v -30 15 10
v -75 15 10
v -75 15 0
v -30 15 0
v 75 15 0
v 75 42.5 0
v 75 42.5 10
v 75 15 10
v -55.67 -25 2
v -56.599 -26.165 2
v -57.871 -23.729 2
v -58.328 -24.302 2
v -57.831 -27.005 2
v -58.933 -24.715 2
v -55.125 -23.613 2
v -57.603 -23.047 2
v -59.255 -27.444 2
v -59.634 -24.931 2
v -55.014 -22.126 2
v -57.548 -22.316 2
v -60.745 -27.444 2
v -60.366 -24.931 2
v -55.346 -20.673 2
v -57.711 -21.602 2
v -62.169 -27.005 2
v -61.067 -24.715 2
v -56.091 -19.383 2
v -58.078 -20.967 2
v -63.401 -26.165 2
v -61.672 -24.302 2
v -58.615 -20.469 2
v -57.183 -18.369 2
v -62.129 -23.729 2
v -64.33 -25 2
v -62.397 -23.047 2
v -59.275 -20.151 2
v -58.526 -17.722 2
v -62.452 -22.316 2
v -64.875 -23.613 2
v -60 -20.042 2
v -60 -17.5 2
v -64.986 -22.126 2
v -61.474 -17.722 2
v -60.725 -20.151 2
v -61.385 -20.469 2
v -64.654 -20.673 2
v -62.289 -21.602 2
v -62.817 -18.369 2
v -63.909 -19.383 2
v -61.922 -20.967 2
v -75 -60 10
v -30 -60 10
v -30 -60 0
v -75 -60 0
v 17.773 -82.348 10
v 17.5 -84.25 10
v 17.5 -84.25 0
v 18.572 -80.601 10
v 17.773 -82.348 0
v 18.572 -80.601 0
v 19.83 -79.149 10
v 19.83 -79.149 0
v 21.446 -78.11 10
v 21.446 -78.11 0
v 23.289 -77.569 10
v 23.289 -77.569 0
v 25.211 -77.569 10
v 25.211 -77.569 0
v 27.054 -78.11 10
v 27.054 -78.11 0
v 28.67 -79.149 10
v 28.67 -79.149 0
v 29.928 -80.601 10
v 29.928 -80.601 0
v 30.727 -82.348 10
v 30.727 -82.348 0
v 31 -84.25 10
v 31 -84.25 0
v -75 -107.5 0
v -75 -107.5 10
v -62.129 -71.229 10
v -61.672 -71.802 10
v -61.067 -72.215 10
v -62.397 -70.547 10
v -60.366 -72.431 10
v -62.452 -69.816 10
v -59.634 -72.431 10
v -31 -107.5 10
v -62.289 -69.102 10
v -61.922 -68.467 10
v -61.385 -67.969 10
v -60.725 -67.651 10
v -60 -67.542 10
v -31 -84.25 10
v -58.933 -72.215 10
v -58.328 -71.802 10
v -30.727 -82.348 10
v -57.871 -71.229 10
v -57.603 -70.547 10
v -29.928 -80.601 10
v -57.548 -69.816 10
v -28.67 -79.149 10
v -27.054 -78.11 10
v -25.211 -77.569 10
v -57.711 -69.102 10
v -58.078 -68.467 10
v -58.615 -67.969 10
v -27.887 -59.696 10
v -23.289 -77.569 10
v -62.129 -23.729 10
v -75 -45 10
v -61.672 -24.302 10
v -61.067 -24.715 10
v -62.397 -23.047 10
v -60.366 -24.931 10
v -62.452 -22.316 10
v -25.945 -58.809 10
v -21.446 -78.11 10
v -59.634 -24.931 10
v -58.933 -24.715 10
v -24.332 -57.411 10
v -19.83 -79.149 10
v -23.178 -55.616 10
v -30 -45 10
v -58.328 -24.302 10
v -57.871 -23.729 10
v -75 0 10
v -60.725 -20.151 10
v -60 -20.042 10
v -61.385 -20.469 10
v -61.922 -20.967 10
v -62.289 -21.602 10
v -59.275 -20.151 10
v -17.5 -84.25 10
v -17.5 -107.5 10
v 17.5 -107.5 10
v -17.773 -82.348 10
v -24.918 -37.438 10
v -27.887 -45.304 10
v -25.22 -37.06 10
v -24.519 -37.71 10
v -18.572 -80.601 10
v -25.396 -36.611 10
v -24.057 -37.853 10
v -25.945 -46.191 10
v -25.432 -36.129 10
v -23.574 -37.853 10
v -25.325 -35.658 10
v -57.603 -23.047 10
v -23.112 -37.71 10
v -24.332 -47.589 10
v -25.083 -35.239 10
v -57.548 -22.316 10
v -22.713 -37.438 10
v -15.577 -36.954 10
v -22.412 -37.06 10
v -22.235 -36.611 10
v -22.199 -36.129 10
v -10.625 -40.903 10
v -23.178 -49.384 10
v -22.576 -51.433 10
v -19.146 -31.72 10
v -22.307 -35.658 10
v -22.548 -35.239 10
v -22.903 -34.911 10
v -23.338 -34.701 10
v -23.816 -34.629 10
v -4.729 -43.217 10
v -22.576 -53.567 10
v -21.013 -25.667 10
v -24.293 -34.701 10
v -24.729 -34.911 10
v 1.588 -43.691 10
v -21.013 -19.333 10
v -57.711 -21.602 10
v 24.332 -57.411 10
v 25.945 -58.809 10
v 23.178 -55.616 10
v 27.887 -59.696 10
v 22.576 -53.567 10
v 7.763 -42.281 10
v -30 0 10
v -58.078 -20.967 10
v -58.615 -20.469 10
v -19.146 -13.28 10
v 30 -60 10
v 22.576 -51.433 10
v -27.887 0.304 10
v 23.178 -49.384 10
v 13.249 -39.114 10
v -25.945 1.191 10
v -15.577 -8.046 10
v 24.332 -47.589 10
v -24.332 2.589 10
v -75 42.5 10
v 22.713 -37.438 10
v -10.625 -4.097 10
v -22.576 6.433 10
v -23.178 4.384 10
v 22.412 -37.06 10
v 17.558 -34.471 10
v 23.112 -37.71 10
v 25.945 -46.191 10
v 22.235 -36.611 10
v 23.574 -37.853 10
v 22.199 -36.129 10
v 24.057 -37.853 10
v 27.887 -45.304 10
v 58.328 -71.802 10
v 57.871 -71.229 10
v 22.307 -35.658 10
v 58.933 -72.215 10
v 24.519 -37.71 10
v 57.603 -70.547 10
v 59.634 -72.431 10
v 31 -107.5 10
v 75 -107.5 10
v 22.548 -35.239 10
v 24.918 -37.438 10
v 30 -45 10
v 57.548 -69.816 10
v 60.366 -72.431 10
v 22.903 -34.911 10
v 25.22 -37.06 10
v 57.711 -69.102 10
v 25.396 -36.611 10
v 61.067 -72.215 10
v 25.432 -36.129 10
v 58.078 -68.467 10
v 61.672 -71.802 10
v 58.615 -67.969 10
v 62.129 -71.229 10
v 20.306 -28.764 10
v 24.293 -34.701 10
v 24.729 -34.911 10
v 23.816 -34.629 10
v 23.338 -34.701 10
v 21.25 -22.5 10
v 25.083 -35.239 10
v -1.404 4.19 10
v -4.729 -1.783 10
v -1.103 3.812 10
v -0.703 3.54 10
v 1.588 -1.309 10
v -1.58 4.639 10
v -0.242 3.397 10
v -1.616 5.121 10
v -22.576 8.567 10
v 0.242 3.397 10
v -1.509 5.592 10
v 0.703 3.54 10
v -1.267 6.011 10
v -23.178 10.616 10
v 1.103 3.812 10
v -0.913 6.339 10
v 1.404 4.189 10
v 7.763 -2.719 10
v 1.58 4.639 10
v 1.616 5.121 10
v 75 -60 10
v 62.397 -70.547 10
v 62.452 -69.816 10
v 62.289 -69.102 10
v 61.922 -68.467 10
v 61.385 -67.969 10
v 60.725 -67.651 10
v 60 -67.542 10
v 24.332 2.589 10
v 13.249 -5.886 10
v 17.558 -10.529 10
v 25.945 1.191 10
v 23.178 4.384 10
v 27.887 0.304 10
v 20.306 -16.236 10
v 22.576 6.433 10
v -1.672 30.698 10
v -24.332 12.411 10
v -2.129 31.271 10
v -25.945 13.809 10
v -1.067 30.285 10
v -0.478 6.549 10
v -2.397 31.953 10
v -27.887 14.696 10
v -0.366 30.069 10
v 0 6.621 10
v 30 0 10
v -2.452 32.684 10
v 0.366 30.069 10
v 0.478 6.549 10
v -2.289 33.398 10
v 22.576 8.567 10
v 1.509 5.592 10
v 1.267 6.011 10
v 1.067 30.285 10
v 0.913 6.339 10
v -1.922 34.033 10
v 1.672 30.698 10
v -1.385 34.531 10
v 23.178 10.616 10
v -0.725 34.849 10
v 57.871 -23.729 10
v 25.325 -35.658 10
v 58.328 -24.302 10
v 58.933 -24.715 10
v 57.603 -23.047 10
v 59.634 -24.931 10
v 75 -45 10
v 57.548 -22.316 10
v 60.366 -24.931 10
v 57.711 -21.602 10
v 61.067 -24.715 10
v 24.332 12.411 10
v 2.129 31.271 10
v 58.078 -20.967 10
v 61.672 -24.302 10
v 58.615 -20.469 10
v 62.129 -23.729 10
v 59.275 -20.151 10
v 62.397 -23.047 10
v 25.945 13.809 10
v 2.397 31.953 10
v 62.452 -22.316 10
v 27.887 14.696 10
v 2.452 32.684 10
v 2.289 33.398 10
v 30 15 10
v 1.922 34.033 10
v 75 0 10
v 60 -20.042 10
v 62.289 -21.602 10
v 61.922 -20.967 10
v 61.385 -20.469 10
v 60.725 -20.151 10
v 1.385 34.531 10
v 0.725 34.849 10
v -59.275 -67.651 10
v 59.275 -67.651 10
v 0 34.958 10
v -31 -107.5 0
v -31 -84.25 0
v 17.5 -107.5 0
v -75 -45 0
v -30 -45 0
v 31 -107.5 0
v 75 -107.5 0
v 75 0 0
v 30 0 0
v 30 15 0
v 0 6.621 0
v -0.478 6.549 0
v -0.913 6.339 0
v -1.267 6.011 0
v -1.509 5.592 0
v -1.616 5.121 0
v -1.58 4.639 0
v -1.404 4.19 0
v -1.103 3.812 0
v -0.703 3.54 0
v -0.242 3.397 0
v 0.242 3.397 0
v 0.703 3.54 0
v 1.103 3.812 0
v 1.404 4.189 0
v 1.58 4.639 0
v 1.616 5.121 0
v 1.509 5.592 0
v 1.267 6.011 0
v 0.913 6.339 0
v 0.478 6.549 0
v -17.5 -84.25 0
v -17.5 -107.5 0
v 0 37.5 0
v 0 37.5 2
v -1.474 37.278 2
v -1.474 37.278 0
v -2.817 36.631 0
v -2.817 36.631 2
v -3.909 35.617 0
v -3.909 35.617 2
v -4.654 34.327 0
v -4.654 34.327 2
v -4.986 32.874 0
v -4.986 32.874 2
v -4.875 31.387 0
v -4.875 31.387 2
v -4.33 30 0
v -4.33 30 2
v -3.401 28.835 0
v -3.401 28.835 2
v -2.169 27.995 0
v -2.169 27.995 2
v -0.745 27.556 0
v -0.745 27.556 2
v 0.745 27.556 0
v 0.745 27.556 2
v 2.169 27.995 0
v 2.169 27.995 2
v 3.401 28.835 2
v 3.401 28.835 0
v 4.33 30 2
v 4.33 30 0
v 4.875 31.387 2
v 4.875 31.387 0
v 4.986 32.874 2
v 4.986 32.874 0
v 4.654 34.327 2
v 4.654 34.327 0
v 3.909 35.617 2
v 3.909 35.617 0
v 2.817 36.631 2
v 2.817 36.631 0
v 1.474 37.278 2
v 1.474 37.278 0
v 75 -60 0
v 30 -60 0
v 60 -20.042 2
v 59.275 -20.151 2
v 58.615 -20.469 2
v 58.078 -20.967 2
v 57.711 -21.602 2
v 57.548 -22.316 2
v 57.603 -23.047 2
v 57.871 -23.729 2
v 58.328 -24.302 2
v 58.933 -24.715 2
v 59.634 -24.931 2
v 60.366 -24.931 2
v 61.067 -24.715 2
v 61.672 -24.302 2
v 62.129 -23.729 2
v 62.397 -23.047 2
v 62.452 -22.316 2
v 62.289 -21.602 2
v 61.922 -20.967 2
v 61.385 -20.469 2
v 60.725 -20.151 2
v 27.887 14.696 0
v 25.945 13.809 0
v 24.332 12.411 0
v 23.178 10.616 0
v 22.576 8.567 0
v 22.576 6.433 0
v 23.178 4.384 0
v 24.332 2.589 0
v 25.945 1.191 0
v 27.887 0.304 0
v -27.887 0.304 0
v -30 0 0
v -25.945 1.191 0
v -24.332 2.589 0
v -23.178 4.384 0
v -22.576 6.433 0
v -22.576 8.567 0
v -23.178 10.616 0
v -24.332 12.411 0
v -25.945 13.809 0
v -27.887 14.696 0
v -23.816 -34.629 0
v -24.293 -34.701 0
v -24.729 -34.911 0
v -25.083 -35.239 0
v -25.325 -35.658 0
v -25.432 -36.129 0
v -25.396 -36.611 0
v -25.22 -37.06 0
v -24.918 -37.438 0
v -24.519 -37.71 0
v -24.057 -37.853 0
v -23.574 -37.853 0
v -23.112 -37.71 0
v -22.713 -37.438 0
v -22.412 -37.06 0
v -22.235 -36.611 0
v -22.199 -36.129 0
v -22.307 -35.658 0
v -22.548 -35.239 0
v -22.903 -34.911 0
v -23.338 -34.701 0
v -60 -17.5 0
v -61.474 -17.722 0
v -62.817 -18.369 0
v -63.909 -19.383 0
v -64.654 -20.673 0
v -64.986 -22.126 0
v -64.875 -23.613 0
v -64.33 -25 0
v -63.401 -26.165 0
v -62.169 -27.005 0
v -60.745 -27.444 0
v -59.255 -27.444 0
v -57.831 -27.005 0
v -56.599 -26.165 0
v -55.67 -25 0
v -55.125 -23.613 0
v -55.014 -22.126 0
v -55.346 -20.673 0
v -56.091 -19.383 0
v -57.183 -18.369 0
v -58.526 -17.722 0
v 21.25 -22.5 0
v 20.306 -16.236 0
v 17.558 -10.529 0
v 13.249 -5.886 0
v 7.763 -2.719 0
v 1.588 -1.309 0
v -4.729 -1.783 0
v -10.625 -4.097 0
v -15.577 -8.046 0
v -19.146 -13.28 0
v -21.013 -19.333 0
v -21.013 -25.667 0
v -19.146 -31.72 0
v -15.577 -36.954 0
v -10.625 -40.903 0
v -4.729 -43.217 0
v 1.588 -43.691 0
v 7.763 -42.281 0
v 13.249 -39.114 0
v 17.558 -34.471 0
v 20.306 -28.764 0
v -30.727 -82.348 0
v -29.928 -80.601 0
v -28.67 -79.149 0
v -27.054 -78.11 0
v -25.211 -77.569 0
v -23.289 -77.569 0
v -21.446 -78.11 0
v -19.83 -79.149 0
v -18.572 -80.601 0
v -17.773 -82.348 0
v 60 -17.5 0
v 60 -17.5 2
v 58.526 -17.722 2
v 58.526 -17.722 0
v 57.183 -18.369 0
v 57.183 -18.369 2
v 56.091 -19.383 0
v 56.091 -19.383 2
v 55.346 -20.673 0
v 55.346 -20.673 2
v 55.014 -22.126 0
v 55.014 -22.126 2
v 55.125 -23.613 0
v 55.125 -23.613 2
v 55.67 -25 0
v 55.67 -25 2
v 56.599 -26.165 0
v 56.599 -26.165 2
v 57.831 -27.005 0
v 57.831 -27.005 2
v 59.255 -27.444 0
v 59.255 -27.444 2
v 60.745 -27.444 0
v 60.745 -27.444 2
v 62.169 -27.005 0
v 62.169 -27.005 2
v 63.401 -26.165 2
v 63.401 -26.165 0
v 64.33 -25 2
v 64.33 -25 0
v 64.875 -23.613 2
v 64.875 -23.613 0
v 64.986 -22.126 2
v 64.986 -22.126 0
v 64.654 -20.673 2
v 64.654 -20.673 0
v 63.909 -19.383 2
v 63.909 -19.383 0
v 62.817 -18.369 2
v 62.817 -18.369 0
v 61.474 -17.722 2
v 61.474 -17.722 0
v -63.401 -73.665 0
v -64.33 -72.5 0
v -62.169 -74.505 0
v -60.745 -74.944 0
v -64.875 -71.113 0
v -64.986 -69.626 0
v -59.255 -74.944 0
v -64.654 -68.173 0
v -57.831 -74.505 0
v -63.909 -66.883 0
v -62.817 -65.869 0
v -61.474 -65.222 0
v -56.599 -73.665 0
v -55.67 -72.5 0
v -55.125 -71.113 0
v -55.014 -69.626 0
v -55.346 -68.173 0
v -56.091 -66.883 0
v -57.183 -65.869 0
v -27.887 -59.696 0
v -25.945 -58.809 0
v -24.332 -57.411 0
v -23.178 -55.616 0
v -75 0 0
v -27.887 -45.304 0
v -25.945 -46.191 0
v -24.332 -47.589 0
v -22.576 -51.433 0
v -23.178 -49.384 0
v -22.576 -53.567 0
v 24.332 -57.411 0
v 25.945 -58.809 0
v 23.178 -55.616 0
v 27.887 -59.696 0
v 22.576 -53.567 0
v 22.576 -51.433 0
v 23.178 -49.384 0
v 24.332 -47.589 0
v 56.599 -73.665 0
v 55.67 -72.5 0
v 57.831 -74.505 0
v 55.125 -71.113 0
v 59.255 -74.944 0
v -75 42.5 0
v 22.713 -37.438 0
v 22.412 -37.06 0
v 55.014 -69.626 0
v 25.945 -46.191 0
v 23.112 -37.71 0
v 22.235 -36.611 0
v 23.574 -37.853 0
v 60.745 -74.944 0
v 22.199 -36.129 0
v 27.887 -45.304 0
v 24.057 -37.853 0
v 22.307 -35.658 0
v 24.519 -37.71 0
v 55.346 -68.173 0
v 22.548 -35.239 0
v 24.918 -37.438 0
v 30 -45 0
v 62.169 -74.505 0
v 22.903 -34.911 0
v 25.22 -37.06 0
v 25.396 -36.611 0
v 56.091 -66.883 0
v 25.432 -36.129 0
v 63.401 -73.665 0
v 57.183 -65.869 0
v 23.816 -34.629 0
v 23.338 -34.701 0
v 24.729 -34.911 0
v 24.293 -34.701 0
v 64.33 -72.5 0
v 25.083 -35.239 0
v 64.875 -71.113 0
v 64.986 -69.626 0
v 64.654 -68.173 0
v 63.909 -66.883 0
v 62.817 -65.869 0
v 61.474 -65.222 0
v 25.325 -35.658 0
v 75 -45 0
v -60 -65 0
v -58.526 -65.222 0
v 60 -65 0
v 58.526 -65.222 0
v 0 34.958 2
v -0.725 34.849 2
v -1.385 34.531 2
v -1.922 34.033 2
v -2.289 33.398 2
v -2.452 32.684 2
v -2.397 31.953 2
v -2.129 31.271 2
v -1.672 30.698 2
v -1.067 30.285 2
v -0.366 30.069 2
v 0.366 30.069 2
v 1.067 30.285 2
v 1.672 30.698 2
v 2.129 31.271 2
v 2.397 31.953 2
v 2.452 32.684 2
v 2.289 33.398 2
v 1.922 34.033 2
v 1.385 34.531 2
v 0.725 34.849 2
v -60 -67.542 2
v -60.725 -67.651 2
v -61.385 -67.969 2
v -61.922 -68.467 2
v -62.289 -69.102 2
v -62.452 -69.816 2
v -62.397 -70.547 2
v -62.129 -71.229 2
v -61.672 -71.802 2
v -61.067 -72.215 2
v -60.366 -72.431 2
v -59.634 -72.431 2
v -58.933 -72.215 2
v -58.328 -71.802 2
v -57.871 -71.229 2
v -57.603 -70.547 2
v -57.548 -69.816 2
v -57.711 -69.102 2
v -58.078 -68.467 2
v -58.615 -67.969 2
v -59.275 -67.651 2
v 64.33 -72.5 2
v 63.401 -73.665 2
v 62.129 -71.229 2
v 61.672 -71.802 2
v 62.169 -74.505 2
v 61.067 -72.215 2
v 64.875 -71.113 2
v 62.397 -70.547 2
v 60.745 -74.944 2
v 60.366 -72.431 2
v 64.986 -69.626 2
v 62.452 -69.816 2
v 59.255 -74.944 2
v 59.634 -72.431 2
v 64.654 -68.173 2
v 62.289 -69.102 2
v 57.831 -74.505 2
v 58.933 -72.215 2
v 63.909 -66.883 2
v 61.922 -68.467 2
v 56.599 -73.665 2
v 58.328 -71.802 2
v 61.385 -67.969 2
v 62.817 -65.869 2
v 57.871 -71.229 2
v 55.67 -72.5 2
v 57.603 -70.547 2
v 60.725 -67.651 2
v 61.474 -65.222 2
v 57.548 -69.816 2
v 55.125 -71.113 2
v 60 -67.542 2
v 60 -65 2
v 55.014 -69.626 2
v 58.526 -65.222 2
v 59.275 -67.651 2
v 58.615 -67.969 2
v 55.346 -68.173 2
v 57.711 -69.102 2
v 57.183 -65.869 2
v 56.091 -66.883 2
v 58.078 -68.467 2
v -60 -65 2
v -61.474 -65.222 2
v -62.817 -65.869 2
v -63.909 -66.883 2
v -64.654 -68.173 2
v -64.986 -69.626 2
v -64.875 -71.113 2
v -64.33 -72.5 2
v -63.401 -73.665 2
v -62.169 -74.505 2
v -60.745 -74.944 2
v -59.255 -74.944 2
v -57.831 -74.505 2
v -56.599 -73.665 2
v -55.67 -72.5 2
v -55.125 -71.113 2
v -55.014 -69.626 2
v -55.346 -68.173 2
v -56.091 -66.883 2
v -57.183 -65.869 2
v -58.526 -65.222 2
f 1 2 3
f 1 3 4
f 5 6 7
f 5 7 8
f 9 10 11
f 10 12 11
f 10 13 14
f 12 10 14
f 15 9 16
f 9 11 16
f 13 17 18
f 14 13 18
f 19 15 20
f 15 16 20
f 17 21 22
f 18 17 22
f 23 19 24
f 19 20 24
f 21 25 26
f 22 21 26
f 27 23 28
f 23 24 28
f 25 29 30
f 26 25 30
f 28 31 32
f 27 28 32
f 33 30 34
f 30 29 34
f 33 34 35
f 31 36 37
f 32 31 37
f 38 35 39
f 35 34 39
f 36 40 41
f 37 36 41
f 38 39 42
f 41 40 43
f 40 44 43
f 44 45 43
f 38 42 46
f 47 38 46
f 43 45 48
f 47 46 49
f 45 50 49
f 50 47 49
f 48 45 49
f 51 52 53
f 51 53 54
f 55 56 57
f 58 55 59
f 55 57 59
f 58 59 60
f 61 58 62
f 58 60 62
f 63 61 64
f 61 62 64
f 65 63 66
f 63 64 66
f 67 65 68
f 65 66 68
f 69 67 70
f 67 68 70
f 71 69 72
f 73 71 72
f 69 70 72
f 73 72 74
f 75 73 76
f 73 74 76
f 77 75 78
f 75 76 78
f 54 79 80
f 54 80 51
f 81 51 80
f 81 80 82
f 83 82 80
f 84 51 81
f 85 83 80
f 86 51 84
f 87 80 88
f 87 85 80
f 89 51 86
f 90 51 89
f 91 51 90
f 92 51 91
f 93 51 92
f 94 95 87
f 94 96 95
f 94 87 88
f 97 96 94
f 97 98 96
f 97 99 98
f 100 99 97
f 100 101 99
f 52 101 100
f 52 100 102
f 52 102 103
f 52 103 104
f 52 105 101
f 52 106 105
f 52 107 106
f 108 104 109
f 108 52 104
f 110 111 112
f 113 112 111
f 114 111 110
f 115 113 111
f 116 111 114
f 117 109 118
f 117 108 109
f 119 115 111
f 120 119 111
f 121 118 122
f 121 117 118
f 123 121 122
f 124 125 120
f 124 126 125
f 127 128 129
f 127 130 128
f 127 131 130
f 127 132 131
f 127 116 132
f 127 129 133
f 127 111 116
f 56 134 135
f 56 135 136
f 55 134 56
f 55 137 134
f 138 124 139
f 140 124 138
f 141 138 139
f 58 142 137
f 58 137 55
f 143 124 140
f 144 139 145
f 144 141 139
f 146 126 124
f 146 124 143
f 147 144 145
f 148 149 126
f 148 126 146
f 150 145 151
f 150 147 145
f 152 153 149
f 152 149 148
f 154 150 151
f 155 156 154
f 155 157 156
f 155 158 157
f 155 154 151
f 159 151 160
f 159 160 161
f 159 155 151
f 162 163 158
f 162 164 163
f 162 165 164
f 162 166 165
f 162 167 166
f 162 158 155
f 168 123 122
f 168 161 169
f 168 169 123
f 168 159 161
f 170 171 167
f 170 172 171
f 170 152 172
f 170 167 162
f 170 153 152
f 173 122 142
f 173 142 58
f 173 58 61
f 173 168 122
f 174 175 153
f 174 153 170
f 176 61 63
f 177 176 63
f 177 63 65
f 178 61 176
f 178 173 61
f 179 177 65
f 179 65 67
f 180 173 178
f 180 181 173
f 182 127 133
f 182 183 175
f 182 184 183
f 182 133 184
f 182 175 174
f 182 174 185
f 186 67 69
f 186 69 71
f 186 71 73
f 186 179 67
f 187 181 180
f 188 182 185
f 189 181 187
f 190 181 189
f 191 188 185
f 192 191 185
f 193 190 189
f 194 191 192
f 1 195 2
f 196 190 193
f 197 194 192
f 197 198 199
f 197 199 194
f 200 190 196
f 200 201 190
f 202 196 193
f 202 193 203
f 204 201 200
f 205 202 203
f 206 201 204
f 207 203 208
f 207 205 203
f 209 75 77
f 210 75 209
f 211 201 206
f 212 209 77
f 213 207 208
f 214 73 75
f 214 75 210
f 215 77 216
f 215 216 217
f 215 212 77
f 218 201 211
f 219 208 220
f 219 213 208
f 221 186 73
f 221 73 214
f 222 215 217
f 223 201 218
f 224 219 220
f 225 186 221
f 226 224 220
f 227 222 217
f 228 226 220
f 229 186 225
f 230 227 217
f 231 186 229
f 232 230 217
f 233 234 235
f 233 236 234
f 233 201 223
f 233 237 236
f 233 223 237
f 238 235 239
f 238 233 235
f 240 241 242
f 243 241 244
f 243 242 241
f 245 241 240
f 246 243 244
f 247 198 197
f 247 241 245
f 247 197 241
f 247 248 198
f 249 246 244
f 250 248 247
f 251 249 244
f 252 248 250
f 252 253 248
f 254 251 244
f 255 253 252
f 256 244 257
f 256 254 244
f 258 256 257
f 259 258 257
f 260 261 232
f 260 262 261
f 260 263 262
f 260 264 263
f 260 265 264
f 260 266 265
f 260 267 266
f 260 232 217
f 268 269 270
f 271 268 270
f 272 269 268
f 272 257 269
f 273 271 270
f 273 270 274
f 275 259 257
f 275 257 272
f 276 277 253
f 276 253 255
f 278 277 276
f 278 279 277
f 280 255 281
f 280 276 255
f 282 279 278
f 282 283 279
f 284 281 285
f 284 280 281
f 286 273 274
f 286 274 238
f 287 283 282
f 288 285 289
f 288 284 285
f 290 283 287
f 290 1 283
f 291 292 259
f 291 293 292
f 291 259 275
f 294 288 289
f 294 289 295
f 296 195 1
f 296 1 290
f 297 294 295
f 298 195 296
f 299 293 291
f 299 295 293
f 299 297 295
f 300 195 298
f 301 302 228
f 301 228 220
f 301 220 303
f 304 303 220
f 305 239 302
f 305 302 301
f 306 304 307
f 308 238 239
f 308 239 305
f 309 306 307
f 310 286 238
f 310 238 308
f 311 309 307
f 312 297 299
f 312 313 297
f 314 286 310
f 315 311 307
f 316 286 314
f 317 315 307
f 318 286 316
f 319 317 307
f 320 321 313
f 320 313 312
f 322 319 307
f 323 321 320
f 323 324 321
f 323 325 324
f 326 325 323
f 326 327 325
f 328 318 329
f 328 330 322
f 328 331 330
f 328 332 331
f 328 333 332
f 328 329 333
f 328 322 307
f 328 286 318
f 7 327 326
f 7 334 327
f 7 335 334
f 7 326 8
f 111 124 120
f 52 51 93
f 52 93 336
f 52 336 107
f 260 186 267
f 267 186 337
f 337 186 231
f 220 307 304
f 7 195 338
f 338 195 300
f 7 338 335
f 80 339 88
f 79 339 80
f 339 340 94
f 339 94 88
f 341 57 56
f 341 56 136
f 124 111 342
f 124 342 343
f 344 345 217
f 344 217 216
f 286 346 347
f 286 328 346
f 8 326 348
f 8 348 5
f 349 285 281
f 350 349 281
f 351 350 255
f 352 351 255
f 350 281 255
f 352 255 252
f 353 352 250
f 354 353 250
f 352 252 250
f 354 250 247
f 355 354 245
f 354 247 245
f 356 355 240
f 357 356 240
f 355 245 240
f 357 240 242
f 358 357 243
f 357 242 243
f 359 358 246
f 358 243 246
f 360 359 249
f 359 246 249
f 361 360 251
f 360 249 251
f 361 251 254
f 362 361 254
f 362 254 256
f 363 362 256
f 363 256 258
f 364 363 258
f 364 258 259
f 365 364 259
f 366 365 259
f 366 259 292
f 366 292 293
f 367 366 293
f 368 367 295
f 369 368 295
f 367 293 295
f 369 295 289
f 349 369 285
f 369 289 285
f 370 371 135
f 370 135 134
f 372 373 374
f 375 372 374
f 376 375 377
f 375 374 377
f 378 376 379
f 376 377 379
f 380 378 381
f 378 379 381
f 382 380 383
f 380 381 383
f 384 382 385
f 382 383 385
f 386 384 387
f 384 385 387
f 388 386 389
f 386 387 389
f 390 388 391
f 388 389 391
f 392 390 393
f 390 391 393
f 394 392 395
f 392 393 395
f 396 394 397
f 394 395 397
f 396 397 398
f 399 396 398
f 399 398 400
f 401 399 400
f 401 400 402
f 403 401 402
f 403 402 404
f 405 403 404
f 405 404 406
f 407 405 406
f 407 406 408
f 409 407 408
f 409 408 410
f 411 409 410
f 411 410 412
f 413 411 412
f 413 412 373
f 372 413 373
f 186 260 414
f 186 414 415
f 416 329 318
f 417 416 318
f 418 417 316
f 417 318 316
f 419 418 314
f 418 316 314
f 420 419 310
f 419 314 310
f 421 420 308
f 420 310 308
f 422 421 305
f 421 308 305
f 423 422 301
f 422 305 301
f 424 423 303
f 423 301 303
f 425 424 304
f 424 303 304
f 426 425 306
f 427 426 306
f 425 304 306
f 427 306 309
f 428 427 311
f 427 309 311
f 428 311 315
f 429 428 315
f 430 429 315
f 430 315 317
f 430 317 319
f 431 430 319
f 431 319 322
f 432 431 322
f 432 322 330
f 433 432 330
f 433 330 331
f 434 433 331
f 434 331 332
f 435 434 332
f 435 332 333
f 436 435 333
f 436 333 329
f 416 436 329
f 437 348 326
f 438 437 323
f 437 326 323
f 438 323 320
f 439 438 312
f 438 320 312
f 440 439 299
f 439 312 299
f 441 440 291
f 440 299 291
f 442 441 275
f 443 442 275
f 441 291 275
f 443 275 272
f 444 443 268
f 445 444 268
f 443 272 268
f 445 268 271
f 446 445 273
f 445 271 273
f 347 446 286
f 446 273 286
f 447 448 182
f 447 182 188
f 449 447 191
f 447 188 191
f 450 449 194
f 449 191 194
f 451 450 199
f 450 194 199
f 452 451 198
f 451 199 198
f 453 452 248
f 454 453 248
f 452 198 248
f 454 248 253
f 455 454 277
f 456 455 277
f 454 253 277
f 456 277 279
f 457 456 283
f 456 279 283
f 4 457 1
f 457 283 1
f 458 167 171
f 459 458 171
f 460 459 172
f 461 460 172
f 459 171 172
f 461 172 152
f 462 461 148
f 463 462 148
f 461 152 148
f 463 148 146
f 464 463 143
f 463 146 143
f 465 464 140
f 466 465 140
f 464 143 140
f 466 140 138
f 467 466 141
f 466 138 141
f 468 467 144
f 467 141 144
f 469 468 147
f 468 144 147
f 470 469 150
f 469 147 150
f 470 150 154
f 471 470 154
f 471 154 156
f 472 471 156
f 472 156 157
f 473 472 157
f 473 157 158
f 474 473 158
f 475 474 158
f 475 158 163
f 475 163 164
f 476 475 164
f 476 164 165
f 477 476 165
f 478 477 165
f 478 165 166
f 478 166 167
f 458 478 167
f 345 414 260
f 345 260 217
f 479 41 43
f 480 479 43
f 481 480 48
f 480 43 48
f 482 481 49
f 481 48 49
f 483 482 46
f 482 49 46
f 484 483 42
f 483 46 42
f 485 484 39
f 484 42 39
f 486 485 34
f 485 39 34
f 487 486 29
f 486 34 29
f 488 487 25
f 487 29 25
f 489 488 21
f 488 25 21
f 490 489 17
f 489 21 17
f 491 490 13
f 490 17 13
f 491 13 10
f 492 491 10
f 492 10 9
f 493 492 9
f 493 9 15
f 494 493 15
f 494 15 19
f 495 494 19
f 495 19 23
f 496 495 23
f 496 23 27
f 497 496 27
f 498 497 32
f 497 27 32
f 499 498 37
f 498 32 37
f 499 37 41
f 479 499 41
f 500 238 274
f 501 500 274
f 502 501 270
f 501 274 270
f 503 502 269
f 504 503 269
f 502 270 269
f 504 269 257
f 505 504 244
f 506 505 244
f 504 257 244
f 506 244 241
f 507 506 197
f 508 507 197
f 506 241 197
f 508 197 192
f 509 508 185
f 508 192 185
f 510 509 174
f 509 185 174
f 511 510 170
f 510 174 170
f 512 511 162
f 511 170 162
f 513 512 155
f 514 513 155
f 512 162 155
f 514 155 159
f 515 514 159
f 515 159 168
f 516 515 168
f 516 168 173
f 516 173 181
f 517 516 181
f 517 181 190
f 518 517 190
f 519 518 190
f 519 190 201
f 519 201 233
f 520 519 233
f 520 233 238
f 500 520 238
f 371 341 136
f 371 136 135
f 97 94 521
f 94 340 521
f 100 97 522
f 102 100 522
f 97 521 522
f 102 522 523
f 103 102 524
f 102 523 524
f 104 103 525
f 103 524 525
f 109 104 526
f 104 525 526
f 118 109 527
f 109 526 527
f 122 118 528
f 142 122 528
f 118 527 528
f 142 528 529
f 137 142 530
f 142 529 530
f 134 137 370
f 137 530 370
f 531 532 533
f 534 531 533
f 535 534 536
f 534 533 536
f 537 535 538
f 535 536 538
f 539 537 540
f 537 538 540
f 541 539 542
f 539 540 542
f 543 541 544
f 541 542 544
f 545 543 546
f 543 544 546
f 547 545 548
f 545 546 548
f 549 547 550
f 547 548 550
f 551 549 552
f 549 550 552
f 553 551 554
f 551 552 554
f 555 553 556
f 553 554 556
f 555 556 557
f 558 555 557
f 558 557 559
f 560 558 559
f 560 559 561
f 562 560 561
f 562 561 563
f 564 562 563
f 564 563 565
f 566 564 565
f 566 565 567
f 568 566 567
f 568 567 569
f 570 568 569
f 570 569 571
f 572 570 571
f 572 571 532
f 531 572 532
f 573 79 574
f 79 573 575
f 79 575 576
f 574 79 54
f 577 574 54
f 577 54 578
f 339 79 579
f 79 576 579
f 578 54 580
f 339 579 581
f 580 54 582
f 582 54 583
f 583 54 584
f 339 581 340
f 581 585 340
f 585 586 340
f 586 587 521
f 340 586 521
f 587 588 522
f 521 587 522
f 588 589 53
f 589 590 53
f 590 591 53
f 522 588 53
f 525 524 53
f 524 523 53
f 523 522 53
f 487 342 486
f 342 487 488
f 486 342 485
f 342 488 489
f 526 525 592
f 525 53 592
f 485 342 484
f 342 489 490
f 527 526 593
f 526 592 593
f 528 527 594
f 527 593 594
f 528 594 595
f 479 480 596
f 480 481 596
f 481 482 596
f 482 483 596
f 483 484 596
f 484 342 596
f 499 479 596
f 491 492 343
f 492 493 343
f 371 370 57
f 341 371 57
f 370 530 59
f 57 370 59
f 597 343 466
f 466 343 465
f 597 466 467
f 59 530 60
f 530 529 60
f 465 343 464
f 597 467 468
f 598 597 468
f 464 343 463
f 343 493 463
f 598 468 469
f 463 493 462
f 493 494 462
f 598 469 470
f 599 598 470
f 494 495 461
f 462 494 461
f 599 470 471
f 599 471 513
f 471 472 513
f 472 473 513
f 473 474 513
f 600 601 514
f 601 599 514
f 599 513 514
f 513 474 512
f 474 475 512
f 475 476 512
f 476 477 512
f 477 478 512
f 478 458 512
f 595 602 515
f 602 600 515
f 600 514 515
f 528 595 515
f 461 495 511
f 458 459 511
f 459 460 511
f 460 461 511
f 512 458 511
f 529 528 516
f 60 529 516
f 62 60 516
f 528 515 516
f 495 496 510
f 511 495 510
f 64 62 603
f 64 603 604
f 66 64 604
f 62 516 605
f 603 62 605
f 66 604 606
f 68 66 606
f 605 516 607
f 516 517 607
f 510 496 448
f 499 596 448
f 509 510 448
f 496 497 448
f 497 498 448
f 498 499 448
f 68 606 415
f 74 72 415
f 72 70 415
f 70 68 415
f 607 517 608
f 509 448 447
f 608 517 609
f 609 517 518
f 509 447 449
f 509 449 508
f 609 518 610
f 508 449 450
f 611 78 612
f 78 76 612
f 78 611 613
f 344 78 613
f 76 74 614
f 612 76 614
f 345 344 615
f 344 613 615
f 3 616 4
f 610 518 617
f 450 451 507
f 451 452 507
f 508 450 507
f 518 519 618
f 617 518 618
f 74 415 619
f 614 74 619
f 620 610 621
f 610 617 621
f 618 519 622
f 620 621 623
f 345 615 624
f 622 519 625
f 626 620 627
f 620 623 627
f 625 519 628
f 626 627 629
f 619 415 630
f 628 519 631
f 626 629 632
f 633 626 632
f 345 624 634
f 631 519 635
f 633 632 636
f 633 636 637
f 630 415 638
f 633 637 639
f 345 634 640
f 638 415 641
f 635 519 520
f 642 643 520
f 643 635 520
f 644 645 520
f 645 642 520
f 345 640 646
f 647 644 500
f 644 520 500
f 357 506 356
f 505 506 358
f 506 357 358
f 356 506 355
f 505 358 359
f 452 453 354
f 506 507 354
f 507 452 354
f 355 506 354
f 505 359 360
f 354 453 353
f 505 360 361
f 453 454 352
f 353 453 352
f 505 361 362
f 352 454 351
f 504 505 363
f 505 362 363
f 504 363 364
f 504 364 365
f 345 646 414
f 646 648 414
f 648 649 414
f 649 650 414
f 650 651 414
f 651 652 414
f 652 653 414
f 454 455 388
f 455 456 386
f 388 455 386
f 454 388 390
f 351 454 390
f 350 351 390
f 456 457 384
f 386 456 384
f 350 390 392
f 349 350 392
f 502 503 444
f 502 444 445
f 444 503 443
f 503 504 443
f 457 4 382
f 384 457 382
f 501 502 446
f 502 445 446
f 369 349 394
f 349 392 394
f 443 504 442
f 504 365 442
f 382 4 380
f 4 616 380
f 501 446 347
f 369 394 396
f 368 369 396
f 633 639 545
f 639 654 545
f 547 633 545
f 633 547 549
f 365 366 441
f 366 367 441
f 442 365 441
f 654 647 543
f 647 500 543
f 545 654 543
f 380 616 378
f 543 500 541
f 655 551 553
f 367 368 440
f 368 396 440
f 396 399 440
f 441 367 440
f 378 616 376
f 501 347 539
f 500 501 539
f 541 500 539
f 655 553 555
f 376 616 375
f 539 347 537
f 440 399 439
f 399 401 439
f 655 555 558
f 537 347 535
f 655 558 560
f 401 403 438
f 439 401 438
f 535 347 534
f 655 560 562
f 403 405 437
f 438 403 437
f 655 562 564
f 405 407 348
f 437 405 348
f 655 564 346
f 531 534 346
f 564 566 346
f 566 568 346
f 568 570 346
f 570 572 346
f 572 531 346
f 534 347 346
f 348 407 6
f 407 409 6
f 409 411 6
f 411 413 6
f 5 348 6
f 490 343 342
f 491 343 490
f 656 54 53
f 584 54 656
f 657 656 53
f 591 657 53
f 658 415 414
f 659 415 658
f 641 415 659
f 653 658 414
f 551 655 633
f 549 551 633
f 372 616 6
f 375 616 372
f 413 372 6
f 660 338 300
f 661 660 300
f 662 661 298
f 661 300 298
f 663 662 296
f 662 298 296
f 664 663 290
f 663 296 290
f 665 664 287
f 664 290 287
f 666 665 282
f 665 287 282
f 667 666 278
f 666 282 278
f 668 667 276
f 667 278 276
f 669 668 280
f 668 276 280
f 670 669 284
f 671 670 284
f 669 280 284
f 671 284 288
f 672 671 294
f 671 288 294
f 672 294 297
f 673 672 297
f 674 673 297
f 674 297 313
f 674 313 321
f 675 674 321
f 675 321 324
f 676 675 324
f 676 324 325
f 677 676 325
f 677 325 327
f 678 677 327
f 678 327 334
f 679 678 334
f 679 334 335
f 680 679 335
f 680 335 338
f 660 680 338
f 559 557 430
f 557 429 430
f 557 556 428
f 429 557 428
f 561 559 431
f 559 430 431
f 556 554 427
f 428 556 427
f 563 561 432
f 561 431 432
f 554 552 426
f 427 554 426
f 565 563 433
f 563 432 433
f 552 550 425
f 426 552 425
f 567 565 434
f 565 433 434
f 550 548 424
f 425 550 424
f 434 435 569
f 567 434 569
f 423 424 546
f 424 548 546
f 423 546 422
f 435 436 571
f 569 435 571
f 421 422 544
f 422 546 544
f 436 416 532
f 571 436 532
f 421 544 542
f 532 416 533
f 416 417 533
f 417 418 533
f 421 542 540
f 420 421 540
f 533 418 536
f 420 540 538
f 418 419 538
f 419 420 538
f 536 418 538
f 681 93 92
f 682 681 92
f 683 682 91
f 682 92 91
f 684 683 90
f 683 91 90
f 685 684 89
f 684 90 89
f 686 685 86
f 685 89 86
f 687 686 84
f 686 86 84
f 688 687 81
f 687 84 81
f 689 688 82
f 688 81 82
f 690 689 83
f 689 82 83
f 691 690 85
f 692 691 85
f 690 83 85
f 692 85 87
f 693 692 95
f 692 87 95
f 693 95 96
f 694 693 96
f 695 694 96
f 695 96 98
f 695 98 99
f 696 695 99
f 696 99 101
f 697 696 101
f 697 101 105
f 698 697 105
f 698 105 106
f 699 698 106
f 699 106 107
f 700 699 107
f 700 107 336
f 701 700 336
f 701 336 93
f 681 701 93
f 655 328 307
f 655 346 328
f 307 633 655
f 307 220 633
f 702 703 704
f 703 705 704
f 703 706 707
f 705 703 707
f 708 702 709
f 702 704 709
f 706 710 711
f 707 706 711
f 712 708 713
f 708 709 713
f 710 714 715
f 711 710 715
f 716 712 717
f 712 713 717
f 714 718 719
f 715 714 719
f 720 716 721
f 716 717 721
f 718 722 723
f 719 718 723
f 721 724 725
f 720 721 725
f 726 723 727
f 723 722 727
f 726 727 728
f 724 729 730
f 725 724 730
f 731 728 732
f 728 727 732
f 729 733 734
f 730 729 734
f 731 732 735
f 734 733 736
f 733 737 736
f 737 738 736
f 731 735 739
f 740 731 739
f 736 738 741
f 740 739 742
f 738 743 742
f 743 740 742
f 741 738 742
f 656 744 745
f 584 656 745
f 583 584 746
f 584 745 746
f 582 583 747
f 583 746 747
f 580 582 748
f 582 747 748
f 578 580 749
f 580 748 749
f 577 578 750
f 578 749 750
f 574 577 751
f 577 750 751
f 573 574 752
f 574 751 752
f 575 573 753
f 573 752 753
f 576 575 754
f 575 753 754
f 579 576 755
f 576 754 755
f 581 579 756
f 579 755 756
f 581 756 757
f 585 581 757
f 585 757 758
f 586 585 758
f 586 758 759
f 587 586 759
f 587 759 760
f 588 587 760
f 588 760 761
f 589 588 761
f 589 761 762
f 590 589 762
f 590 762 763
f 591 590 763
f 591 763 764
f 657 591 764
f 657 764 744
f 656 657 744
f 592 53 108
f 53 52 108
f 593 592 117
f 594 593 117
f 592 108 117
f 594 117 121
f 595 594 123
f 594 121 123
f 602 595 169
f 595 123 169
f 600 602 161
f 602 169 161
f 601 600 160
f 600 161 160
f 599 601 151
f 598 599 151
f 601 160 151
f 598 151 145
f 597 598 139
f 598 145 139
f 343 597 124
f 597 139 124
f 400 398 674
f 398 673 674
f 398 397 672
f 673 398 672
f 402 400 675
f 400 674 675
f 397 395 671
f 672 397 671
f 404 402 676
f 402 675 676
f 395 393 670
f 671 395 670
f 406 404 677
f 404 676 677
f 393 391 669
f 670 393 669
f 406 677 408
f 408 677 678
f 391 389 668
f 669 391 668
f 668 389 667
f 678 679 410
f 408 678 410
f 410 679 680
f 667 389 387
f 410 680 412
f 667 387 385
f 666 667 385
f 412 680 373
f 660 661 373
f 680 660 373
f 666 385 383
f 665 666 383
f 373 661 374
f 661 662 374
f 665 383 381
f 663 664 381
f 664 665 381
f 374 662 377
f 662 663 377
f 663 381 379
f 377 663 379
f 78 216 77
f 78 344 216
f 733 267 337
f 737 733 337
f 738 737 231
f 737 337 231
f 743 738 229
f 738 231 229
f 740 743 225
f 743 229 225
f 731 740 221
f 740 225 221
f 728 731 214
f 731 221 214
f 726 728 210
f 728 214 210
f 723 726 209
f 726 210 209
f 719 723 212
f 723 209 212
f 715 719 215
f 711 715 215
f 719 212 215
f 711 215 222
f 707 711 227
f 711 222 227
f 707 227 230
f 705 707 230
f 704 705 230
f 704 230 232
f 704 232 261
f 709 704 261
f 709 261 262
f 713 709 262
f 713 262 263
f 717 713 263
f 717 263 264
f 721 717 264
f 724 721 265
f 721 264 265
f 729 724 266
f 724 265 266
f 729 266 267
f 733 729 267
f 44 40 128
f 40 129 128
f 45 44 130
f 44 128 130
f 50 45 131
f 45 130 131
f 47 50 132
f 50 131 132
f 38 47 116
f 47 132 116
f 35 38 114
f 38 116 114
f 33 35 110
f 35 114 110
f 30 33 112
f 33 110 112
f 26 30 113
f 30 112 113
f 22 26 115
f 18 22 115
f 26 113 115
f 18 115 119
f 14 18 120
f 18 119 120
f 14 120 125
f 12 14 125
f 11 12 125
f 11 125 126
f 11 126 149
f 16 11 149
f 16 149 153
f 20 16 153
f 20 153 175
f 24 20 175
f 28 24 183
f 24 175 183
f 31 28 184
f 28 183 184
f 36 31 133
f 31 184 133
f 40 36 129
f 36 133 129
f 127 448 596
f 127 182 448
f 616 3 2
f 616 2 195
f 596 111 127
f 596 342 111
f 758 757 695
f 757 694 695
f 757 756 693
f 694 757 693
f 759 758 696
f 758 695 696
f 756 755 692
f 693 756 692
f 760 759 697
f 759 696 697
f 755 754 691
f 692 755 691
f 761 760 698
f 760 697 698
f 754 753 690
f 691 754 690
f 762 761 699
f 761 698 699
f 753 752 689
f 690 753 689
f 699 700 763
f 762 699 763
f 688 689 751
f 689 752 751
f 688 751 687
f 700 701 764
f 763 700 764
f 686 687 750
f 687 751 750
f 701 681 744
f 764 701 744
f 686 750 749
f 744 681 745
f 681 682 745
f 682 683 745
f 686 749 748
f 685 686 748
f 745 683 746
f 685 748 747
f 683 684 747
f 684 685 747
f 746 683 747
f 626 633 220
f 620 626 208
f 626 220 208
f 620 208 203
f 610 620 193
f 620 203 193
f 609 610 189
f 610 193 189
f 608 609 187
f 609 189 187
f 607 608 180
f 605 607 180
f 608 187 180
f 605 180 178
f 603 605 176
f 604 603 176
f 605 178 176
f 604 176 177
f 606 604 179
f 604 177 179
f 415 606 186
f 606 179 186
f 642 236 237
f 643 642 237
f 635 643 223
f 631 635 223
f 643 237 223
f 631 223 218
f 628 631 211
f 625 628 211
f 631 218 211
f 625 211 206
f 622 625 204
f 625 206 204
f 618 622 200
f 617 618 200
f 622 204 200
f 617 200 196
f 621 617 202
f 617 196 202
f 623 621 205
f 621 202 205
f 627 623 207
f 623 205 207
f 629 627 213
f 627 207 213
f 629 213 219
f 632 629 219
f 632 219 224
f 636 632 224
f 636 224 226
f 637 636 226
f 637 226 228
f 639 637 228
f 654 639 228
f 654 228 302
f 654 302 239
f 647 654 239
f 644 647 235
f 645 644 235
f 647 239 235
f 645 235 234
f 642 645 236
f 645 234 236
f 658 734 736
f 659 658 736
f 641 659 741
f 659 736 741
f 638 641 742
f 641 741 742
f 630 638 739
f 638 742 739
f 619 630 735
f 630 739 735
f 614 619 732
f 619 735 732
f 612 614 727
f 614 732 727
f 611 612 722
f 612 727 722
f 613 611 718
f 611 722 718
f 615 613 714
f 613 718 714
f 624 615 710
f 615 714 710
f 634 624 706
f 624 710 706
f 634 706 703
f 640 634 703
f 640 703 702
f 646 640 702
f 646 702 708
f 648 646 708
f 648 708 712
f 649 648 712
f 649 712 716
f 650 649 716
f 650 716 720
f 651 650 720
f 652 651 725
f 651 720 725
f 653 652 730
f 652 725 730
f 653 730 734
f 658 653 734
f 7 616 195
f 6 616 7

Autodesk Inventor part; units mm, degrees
ref_plane "YZ Plane" through (0, 0, 0) normal (1, 0, 0) x (0, 1, 0)
ref_plane "XZ Plane" through (0, 0, 0) normal (0, 1, 0) x (-1, 0, 0)
ref_plane "XY Plane" through (0, 0, 0) normal (0, 0, 1) x (1, 0, 0)
sketch "Sketch1" plane through (0, 0, 0) normal (0, 0, 1) x (1, 0, 0)
  line L0 (-75, 42.5) -> (75, 42.5)
  line L1 (75, 42.5) -> (75, -107.5)
  line L2 (75, -107.5) -> (-75, -107.5)
  line L3 (-75, -107.5) -> (-75, 42.5)
  point P0 (0, 0)
  dimension "d0" = 150
  dimension "d1" = 75
  dimension "d2" = 150
  dimension "d85" = 42.5
extrude "baseExtrusion" add sketch "Sketch1" along normal blind 10
sketch "Sketch3" plane through (0, 0, 10) normal (0, 0, 1) x (1, 0, 0)
  circle A0 centre (0, -22.5) radius 21.25
  line L0 (-75, -107.5) -> (75, -107.5) projected
  line L1 (-75, 42.5) -> (-75, -107.5) projected
  line L2 (75, 42.5) -> (-75, 42.5) projected
  dimension "d16" = 42.5
  dimension "d68" = 75
  dimension "d84" = 65
extrude "objectiveExtrusion" cut sketch "Sketch3" against normal through all
sketch "Sketch5" plane through (0, 0, 10) normal (0, 0, 1) x (1, 0, 0)
  line L0 (30, 15) -> (75, 15)
  line L1 (75, 15) -> (75, 0)
  line L2 (75, 0) -> (30, 0)
  line L3 (22.5, 7.5) -> (22.5, 7.5)
  line L4 (75, -107.5) -> (75, 42.5) projected
  arc A0 (30, 15) -> (22.5, 7.5) centre (30, 7.5) ccw
  arc A1 (22.5, 7.5) -> (30, 0) centre (30, 7.5) ccw
  circle A2 centre (0, -22.5) radius 21.25 projected
  point P0 (0, 0)
  point P1 (22.5, 15)
  dimension "d34" = 15
  dimension "d35" = 7.5
  dimension "d54" = 30
  dimension "d67" = 30
extrude "cageRodBase1" cut sketch "Sketch5" against normal through all contours L0 L1 L2 A1 A0
mirror "cageRodBase2" about plane through (0, 0, 0) normal (1, 0, 0) of "cageRodBase1"
pattern_linear "cageRodBase34" count 2 spacing 60 along (0, -1, 0) of "cageRodBase1", "cageRodBase2"
sketch "Sketch8" plane through (0, 0, 0) normal (0, 0, -1) x (-1, 0, 0)
  line L0 (75, 0) -> (75, -45) projected
  line L1 (75, 15) -> (75, 42.5) projected
  circle A0 centre (0, -22.5) radius 21.25 projected
  point P0 (0, 0)
  point P1 (0, 5)
  point P2 (-23.8157, -36.25)
  point P3 (23.8157, -36.25)
  dimension "d71" = 75
  dimension "d72" = 27.5
  dimension "d75" = 360
hole "objectiveHolderMountingHoles" at (-23.8157, -36.25, 0) at (23.8157, -36.25, 0) at (0, 5, 0) direction (0, 0, 1) diameter 3.242 end through all thread size "M4x0.7" class "6H" standard "ISO Metric profile"
sketch "Sketch9" plane through (0, 0, 0) normal (0, 0, -1) x (-1, 0, 0)
  line L0 (75, -60) -> (30, -60) projected
  line L1 (30, -45) -> (75, -45) projected
  arc A0 (30, -45) -> (30, -60) centre (30, -52.5) ccw projected
  point P0 (0, 0)
  point P1 (60, -70)
  point P2 (-60, -70)
  point P3 (60, -22.5)
  point P4 (-60, -22.5)
  point P5 (0, 32.5)
  dimension "d87" = 120
  dimension "d88" = 60
  dimension "d97" = 30
  dimension "d98" = 55
  dimension "d99" = 47.5
hole "m6MountingHoles" at (-60, -70, 0) at (60, -70, 0) at (-60, -22.5, 0) at (60, -22.5, 0) at (0, 32.5, 0) direction (0, 0, 1) diameter 4.917 end through all counterbore diameter 10 counterbore depth 2 thread size "M6x1" class "6H" standard "ISO Metric profile"
sketch "Sketch11" plane through (0, 0, 0) normal (0, 0, -1) x (-1, 0, 0)
  line L0 (31, -107.5) -> (17.5, -107.5)
  line L1 (17.5, -107.5) -> (17.5, -84.25)
  line L2 (24.25, -77.5) -> (24.25, -77.5)
  line L3 (31, -84.25) -> (31, -107.5)
  line L4 (-75, -107.5) -> (75, -107.5) projected
  arc A0 (31, -84.25) -> (24.25, -77.5) centre (24.25, -84.25) ccw
  arc A1 (24.25, -77.5) -> (17.5, -84.25) centre (24.25, -84.25) ccw
  point P0 (0, 0)
  point P1 (17.5, -77.5)
  dimension "d110" = 13.5
  dimension "d111" = 30
  dimension "d112" = 6.75
  dimension "d113" = 6.75
  dimension "d114" = 24.25
extrude "filterWheelPost1" cut sketch "Sketch11" against normal through all
mirror "filterWheelPost2" about plane through (0, 0, 0) normal (1, 0, 0) of "filterWheelPost1"
equation "\"d1\" = 0.5 * d0"
equation "\"d68\" = 0.5 * d0"
equation "\"d71\" = d68"
equation "\"d88\" = 0.5 * d87"
properties part number "rectangularObjectiveHolder"
